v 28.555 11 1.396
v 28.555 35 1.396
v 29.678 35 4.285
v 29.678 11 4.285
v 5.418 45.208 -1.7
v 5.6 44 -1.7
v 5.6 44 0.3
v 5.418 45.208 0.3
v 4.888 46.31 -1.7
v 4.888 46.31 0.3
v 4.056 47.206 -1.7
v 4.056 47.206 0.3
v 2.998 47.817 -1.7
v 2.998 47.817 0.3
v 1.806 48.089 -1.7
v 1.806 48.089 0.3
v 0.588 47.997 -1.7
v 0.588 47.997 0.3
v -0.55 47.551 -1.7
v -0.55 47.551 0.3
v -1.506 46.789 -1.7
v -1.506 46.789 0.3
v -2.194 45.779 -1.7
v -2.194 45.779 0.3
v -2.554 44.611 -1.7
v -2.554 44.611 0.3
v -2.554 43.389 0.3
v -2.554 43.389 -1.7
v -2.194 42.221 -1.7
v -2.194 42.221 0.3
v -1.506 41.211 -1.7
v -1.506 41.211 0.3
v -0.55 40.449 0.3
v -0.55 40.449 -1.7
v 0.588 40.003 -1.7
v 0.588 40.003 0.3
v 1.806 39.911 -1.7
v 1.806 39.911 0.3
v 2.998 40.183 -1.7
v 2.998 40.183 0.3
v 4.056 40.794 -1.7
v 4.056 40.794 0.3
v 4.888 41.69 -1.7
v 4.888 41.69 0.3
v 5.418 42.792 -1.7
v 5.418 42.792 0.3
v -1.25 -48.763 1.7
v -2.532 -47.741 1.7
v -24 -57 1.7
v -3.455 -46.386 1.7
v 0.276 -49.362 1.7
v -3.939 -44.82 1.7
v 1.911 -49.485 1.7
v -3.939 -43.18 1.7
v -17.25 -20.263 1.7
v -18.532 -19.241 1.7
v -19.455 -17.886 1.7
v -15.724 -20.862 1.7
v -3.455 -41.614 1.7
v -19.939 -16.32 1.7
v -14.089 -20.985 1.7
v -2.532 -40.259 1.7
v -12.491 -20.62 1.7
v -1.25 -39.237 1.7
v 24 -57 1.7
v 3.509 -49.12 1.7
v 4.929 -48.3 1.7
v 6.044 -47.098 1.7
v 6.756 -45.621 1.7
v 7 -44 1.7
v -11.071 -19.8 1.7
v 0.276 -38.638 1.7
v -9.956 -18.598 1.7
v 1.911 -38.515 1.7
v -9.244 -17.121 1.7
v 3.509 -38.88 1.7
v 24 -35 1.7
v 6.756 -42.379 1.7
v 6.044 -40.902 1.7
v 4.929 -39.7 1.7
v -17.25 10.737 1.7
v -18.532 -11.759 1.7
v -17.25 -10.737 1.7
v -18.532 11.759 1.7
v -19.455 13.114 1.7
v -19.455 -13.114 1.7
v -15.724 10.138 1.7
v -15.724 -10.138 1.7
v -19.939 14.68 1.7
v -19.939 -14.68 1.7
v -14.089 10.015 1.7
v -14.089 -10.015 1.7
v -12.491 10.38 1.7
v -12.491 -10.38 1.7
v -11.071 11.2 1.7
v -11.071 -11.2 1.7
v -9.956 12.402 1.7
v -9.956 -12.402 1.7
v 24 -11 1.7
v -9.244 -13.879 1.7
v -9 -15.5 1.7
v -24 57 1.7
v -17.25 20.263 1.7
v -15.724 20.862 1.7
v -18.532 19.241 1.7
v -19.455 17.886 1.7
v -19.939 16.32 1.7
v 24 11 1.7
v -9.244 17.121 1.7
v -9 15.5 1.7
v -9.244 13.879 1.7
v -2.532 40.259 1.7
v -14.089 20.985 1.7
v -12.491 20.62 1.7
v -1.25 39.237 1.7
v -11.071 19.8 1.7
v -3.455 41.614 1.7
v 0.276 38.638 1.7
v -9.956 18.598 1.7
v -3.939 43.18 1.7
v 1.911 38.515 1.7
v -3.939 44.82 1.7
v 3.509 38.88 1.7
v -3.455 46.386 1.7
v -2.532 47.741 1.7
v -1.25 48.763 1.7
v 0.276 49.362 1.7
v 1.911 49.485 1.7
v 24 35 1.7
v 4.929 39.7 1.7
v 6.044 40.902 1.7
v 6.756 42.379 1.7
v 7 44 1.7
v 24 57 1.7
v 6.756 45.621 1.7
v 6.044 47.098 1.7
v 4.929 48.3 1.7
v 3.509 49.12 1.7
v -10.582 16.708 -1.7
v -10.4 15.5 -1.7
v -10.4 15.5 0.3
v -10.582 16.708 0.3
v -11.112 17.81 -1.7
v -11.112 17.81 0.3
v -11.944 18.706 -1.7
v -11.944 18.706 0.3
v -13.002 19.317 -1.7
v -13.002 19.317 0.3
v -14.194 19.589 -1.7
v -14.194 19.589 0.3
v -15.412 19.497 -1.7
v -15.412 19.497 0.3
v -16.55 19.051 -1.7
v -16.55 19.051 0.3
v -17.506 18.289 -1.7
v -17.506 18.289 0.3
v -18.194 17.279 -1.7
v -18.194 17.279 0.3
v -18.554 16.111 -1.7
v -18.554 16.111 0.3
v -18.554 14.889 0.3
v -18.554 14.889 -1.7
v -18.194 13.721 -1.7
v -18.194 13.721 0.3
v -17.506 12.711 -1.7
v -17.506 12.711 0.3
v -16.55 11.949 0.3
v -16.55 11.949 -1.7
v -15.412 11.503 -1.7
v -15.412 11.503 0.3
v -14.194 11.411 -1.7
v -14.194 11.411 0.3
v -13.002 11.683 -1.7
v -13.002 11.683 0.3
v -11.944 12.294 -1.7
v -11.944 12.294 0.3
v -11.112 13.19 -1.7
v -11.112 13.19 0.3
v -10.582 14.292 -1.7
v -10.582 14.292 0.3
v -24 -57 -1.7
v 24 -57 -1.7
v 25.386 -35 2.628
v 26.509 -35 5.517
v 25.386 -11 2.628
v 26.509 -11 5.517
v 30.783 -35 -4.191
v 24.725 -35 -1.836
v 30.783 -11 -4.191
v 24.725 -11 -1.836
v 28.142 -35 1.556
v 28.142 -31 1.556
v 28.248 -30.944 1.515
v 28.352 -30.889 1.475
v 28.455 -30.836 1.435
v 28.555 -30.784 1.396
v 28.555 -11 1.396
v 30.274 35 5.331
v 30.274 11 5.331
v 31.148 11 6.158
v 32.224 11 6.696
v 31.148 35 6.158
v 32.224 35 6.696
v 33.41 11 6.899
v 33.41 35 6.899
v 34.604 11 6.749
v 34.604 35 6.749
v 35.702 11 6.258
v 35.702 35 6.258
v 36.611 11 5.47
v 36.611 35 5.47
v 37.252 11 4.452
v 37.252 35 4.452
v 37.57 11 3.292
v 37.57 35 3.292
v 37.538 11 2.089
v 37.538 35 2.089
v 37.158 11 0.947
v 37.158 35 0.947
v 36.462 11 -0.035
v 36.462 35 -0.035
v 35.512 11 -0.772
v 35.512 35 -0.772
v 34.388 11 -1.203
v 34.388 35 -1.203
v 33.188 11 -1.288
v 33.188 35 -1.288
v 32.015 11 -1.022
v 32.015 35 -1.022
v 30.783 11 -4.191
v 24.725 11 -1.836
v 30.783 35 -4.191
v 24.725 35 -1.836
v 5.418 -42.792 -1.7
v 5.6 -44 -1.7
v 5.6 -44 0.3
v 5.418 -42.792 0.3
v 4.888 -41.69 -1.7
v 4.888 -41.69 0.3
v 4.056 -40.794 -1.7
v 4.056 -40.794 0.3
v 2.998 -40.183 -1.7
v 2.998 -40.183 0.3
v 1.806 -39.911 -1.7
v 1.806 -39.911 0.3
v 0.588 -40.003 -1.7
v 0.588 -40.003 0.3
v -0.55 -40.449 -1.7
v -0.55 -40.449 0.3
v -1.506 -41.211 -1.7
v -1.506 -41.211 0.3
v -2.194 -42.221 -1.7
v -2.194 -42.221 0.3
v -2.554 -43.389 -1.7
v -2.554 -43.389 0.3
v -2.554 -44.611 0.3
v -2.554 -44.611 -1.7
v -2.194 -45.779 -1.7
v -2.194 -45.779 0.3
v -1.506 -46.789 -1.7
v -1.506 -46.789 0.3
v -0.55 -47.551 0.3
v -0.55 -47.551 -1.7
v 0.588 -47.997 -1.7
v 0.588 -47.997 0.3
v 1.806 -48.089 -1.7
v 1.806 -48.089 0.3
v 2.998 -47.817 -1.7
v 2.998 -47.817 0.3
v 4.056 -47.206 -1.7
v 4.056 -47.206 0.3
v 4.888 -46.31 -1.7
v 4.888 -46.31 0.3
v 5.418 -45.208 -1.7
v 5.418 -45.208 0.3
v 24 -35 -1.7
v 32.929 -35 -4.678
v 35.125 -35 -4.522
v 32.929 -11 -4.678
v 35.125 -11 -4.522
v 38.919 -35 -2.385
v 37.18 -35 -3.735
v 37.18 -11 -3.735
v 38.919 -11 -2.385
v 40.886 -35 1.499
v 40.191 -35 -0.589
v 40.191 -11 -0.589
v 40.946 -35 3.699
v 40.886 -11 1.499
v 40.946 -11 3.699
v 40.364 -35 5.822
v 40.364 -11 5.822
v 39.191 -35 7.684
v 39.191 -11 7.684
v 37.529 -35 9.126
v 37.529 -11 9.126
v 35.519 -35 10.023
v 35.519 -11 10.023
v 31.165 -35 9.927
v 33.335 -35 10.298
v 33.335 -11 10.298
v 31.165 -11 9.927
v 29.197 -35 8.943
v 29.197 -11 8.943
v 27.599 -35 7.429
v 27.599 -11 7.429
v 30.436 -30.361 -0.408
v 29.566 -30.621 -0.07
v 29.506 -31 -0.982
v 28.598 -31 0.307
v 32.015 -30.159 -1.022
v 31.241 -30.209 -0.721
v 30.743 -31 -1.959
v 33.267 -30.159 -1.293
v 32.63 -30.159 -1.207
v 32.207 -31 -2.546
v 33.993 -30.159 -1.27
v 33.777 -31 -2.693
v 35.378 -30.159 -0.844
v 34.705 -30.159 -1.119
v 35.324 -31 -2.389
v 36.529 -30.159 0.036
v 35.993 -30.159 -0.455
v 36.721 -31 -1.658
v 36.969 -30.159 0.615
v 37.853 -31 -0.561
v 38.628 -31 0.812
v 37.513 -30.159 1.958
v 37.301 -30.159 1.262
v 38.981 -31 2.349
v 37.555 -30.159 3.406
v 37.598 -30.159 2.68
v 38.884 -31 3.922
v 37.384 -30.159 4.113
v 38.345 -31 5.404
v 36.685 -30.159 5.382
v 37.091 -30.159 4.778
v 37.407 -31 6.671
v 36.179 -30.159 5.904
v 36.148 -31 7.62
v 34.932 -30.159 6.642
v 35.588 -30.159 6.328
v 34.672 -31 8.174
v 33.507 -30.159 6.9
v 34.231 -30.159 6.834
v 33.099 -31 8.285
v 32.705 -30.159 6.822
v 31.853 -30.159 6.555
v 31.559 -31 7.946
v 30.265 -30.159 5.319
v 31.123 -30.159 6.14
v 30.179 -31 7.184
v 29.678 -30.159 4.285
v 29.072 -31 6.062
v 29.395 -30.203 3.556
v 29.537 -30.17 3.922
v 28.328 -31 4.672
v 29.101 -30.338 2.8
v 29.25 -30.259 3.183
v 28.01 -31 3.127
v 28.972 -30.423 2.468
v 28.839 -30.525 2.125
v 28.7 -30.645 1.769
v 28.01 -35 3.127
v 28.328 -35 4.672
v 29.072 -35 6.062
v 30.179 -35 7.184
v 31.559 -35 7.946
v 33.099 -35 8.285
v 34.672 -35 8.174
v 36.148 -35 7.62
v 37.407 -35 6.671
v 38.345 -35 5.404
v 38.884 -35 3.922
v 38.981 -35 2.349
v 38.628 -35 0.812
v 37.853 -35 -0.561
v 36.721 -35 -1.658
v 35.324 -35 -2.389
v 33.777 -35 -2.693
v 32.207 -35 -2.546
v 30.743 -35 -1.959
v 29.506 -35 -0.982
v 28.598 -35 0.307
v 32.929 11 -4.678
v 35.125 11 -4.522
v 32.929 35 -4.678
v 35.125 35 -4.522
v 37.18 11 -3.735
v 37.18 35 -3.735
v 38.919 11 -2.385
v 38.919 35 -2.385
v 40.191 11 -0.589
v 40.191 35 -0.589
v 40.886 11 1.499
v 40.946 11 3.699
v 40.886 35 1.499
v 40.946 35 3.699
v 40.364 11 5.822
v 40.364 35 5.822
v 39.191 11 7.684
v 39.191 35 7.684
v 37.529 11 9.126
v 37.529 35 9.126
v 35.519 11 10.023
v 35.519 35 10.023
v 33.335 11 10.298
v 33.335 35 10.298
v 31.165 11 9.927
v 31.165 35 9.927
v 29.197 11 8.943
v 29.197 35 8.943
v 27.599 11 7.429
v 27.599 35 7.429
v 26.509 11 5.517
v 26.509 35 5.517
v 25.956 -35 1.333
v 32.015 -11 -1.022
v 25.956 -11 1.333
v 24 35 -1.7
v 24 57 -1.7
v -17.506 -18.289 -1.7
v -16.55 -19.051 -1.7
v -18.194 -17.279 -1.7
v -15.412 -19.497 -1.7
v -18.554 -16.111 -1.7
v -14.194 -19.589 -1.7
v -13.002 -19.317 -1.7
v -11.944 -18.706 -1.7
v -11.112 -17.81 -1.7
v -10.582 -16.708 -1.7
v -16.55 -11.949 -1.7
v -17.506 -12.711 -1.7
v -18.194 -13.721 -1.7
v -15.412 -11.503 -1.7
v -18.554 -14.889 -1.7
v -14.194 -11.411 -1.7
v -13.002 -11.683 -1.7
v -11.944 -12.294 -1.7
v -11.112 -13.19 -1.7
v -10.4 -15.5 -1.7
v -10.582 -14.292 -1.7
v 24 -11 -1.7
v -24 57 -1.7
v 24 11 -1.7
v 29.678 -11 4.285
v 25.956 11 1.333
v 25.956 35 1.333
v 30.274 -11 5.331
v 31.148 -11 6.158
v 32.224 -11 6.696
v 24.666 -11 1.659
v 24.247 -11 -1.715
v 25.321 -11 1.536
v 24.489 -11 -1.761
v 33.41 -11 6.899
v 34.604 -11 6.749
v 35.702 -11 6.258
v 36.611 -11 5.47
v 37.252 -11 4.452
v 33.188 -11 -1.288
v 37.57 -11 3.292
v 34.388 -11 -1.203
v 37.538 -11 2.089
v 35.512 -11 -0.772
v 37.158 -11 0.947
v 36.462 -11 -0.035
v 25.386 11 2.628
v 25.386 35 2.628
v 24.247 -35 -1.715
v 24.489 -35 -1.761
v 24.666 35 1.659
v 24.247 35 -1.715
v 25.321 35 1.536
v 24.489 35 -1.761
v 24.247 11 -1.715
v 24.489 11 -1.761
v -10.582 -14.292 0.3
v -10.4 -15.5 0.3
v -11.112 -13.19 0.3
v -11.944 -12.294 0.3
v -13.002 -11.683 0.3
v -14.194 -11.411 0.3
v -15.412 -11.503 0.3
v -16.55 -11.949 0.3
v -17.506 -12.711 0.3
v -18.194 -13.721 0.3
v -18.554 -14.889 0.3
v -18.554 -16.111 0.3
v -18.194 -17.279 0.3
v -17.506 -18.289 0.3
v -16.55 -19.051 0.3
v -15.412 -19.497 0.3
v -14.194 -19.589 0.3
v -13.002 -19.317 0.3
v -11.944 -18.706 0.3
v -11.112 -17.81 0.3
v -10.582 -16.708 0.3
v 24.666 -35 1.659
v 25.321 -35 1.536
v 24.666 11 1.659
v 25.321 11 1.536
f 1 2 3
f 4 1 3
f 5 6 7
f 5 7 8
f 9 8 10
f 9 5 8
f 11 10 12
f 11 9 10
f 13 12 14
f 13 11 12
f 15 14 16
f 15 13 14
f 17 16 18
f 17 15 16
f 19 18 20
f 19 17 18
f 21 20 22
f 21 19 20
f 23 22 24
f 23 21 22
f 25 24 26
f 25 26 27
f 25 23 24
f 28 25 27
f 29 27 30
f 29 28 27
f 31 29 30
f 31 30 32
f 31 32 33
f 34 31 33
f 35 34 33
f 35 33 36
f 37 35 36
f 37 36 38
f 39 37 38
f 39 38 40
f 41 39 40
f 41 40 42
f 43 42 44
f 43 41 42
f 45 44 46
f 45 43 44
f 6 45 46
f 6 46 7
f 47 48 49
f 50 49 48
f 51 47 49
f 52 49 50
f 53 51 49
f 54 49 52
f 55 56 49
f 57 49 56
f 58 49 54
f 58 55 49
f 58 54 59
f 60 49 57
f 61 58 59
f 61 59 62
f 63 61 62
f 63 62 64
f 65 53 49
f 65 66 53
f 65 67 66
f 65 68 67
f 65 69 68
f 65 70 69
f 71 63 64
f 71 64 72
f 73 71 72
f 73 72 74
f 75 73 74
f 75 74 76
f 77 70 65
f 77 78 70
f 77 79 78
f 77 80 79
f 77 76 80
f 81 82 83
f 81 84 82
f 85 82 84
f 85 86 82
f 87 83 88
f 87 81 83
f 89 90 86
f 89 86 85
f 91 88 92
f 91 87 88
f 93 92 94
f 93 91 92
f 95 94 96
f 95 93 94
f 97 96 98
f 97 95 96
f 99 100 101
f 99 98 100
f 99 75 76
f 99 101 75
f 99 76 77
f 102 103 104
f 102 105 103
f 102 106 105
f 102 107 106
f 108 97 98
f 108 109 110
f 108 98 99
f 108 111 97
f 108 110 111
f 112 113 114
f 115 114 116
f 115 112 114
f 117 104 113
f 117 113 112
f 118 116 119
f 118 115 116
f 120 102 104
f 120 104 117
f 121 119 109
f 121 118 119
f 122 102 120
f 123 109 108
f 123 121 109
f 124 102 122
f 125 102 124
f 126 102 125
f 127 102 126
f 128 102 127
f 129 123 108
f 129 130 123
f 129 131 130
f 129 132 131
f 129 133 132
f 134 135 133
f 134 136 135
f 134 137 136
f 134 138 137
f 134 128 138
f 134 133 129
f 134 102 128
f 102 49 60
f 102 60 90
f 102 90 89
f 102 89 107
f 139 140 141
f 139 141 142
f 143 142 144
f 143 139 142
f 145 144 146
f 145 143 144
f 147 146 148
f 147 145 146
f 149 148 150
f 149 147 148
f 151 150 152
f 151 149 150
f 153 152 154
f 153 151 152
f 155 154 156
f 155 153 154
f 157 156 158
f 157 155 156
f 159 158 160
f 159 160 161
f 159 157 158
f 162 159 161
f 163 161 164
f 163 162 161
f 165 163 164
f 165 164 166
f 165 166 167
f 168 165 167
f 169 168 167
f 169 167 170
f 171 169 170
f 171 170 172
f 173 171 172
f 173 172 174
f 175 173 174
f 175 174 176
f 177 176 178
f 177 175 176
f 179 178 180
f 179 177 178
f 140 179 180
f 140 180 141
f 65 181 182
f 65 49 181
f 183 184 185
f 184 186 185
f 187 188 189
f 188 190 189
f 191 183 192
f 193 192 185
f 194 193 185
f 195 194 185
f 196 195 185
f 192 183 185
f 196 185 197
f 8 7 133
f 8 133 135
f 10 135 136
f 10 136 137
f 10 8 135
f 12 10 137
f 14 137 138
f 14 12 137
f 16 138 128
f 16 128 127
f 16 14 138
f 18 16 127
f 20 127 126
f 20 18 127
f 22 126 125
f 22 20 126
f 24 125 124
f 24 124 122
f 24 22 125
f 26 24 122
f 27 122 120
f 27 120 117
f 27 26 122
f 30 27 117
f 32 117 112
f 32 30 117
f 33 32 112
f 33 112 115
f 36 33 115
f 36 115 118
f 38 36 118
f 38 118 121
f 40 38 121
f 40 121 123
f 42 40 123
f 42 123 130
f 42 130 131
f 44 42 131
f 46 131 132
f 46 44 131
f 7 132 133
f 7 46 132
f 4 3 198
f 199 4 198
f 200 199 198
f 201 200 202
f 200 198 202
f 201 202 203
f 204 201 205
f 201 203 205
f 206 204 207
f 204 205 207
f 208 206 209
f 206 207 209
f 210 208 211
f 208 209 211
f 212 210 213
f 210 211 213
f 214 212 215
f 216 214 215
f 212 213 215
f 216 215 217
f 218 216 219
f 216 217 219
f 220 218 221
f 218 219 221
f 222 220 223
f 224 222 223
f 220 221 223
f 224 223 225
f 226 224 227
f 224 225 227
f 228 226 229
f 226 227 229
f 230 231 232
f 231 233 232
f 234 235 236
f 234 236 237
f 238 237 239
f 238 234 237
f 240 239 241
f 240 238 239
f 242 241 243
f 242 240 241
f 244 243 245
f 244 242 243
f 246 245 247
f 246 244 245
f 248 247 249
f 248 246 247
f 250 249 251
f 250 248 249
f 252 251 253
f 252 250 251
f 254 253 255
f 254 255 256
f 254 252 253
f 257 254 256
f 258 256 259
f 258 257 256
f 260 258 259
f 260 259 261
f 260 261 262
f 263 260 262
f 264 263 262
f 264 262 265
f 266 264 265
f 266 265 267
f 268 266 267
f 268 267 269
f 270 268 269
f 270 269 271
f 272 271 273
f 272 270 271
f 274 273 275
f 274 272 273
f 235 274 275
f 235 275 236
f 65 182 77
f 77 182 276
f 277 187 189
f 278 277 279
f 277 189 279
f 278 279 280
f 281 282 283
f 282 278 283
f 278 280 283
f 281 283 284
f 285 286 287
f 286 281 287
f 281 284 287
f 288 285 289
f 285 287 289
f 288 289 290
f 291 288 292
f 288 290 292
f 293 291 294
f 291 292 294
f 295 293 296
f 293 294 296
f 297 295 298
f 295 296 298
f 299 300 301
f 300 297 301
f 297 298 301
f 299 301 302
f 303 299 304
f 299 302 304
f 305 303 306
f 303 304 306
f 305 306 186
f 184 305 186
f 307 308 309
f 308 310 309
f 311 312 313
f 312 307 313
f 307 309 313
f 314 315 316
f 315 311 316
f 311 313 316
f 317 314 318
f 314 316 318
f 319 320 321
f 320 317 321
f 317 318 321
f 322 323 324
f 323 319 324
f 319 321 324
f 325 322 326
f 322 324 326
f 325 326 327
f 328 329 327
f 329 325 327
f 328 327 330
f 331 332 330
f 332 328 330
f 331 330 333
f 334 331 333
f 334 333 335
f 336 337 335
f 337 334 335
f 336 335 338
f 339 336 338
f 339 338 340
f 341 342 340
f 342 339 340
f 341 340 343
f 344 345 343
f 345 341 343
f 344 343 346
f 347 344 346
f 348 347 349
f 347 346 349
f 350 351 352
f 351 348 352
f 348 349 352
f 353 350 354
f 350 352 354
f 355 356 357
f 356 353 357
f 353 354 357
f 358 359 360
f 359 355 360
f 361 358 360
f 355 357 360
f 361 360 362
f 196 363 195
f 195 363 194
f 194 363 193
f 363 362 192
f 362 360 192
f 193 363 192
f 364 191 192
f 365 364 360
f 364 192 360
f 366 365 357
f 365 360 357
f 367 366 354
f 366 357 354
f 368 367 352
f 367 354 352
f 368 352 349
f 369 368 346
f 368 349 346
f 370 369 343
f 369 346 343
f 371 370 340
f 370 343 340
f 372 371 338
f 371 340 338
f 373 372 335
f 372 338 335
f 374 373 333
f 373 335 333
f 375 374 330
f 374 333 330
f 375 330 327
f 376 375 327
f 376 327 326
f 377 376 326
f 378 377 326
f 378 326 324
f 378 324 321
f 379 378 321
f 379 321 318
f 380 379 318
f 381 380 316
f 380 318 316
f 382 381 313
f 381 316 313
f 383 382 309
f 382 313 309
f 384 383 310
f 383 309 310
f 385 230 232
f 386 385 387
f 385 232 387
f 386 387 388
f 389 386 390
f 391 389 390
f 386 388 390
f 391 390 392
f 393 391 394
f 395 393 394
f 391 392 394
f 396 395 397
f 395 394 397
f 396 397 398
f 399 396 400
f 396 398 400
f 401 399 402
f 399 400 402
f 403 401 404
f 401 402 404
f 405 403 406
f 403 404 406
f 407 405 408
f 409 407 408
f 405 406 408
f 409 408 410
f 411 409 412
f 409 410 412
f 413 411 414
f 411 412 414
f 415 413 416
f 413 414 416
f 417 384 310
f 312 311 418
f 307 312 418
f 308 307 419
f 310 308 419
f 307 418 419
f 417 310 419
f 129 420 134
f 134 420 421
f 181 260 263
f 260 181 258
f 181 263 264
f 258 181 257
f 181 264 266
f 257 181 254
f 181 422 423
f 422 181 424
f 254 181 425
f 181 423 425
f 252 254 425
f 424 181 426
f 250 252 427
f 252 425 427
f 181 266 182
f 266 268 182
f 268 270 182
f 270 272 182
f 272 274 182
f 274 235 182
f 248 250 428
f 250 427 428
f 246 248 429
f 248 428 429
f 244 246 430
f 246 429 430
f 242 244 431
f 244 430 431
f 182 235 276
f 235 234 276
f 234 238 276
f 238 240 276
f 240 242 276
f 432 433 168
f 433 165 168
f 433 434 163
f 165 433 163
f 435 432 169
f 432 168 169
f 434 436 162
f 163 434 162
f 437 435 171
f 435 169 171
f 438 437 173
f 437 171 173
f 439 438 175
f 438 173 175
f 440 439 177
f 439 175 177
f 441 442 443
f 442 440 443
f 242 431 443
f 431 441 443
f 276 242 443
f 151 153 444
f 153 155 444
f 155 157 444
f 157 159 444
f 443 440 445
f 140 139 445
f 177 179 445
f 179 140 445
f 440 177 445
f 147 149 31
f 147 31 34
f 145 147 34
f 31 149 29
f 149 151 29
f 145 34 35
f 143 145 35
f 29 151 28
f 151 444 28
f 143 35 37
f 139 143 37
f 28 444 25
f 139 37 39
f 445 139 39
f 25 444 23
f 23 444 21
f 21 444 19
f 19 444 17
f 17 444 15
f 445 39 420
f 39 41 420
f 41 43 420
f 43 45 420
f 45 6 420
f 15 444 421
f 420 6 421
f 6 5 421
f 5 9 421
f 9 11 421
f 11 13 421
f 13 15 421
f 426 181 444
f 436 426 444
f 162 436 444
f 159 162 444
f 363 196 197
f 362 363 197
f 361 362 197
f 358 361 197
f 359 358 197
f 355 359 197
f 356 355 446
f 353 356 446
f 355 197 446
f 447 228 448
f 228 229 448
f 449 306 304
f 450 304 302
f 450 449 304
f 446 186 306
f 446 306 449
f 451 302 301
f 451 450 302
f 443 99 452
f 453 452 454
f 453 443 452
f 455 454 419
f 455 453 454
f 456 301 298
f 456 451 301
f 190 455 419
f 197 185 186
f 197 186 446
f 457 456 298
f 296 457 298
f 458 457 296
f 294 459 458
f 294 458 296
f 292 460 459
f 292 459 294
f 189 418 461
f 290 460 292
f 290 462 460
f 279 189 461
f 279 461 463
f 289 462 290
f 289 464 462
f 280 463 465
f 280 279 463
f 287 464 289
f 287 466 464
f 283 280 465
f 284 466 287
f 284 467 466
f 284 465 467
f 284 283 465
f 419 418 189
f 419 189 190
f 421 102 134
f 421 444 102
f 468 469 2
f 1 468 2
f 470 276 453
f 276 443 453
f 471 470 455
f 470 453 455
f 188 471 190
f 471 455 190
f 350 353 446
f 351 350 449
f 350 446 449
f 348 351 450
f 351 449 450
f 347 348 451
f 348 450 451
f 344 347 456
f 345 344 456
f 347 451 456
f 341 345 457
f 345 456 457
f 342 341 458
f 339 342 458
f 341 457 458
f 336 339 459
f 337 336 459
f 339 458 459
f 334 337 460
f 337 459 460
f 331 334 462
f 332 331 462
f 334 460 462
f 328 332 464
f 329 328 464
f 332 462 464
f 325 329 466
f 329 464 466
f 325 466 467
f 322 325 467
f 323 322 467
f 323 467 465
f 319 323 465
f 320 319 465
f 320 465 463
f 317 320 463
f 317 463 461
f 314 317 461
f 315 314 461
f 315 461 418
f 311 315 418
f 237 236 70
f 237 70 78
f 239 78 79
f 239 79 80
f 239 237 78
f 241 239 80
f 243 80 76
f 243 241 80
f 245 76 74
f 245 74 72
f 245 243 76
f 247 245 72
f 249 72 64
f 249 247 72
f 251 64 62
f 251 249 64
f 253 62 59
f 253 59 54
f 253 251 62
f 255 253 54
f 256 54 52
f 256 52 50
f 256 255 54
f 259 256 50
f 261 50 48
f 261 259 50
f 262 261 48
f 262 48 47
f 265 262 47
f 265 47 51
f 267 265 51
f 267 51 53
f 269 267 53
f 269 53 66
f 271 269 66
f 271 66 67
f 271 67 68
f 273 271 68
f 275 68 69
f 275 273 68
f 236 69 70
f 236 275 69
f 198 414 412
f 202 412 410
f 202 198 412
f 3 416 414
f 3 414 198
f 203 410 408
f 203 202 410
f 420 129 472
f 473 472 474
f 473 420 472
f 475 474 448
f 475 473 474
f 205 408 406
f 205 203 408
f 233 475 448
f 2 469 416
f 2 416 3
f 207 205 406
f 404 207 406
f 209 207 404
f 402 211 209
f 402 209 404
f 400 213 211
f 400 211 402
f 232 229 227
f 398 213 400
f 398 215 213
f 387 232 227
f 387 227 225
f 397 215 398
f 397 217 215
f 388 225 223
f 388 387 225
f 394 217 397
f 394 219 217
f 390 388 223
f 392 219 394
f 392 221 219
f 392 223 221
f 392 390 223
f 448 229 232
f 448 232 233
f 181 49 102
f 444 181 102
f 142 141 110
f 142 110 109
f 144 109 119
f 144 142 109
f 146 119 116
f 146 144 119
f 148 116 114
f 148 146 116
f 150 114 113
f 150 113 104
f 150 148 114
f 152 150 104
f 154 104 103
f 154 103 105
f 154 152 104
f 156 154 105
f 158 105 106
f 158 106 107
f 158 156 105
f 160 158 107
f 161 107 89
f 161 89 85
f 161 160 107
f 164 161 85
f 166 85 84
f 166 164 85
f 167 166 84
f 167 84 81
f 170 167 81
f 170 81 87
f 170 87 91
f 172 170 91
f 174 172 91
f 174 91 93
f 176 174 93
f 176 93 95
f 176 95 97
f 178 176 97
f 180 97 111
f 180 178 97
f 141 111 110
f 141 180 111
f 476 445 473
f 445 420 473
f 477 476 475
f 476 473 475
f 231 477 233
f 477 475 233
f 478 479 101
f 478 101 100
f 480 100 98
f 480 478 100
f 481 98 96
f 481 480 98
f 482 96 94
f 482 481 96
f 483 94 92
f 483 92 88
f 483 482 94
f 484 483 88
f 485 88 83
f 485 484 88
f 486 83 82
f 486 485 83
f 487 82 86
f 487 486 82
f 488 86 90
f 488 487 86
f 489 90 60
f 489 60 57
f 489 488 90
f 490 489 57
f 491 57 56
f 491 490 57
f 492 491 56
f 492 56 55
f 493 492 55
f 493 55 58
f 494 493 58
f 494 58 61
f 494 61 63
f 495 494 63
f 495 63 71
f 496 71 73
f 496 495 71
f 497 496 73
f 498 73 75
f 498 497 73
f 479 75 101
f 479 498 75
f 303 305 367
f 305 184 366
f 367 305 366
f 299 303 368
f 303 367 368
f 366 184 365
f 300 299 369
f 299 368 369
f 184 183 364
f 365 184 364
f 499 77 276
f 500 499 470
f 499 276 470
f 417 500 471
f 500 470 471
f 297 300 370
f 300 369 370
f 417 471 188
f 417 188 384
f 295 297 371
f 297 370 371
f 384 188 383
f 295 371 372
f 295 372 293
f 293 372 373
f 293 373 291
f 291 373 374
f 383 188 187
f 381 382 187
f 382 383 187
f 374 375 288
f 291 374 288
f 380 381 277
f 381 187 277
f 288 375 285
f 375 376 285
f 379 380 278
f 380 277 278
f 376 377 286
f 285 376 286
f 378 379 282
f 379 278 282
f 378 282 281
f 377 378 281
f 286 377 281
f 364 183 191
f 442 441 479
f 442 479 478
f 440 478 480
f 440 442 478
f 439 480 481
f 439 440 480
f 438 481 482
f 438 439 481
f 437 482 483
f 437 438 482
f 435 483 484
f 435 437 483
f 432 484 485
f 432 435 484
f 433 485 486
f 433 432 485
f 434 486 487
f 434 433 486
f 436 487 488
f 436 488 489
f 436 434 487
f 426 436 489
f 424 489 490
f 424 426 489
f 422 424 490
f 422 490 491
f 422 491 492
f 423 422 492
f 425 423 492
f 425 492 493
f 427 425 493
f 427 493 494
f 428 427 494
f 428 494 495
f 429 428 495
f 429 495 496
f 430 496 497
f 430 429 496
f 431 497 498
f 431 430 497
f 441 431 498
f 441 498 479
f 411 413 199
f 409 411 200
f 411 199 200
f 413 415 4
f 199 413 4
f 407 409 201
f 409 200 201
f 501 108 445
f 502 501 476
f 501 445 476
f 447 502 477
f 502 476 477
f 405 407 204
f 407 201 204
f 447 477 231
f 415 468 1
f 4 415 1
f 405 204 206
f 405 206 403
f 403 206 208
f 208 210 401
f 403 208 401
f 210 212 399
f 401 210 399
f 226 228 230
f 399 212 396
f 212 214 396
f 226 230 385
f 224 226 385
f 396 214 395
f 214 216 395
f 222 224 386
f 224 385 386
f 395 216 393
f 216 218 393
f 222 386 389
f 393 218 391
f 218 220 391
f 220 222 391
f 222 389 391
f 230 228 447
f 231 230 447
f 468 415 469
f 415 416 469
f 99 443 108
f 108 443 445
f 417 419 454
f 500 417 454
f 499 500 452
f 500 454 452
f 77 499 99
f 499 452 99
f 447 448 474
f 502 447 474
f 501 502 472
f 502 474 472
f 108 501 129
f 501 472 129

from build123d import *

# Parameters (mm, degrees)
BODYS_W                        = 48
BODYS_H                        = 114
BODY_DEPTH                     = 1.7
MIRROR1_START                  = -1.7
MIRROR1_OUTLINE_R              = 4.1
MIRROR1_DEPTH                  = 3.4
KNUCKLEBODY_REACH              = 63.87
KNUCKLEBODY_DIRECTION_2_REACH  = 63.87
KNUCKLECUT_DEPTH               = 71.965414111
KNUCKLECUT_DEPTH_BACK          = 71.965414111
KNUCKLECUTS_W                  = 17
KNUCKLECUTS_H                  = 22
HOLECHAMFER_SIZE               = 1.4
F_11_0_11_DIAMETER_HOLE2_D     = 11
F_11_0_11_DIAMETER_HOLE2_DEPTH = 4
F_11_0_11_DIAMETER_HOLE2_TIP   = 3.304733405


# Read off the part's stored shape, not the designer's step: Mirror1
with BuildPart() as part:
    # BodyS → Body (new, symmetric)
    with BuildSketch(Plane.XY):
        Rectangle(BODYS_W, BODYS_H)
    extrude(amount=BODY_DEPTH, both=True)

    # Mirror1 outline → Mirror1 (cut)
    with BuildSketch(Plane.XY.offset(MIRROR1_START)):
        with Locations((-14.5, 15.5)):
            Circle(MIRROR1_OUTLINE_R)
        with Locations((1.5, 44)):
            Circle(MIRROR1_OUTLINE_R)
        with Locations((-14.5, -15.5)):
            Circle(MIRROR1_OUTLINE_R)
        with Locations((1.5, -44)):
            Circle(MIRROR1_OUTLINE_R)
    extrude(amount=MIRROR1_DEPTH, mode=Mode.SUBTRACT)

    # KnuckleBody: up to this face of the body (flat: up to its plane)
    knucklebody_end = Plane(part.part.faces().sort_by_distance((0, 57, 0))[0])
    # KnuckleBodyS → KnuckleBody (add, up to the picked face)
    with BuildSketch(Plane(origin=(0, 0, 0), x_dir=(1, 0, 0), z_dir=(0, 1, 0)), mode=Mode.PRIVATE) as knucklebody_sk1:
        with BuildLine():
            Line((25.386415094, -2.62754717), (28.555471698, -1.395849057))
            Line((28.555471698, -1.395849057), (29.678490566, -4.285283019))
            ThreePointArc((29.678490566, -4.285283019), (37.25246893, -4.451961541), (32.014716981, 1.021509434))
            Line((32.014716981, 1.021509434), (25.956226415, -1.333207547))
            ThreePointArc((25.956226415, -1.333207547), (24.995158089, -1.607509809), (24, -1.7))
            Line((24, -1.7), (24, 1.7))
            ThreePointArc((24, 1.7), (24.36857707, 1.734255626), (24.724528302, 1.835849057))
            Line((24.724528302, 1.835849057), (30.783018868, 4.190566038))
            ThreePointArc((30.783018868, 4.190566038), (40.364272432, -5.821880867), (26.509433962, -5.516981132))
            Line((26.509433962, -5.516981132), (25.386415094, -2.62754717))
        make_face()
    knucklebody_tool1 = split(extrude(knucklebody_sk1.sketch, amount=KNUCKLEBODY_REACH, mode=Mode.PRIVATE), bisect_by=knucklebody_end, keep=Keep.BOTH, mode=Mode.PRIVATE)
    add(knucklebody_tool1.solids().sort_by(Axis((26.159241, 0, 3.990133), (0, 1, 0)))[0])

    # KnuckleBody direction 2: up to this face of the body (flat: up to its plane)
    knucklebody_direction_2_end = Plane(part.part.faces().sort_by_distance((0, -57, 0))[0])
    # KnuckleBodyS → KnuckleBody direction 2 (add, up to the picked face)
    with BuildSketch(Plane(origin=(0, 0, 0), x_dir=(1, 0, 0), z_dir=(0, 1, 0)), mode=Mode.PRIVATE) as knucklebody_direction_2_sk1:
        with BuildLine():
            Line((25.386415094, -2.62754717), (28.555471698, -1.395849057))
            Line((28.555471698, -1.395849057), (29.678490566, -4.285283019))
            ThreePointArc((29.678490566, -4.285283019), (37.25246893, -4.451961541), (32.014716981, 1.021509434))
            Line((32.014716981, 1.021509434), (25.956226415, -1.333207547))
            ThreePointArc((25.956226415, -1.333207547), (24.995158089, -1.607509809), (24, -1.7))
            Line((24, -1.7), (24, 1.7))
            ThreePointArc((24, 1.7), (24.36857707, 1.734255626), (24.724528302, 1.835849057))
            Line((24.724528302, 1.835849057), (30.783018868, 4.190566038))
            ThreePointArc((30.783018868, 4.190566038), (40.364272432, -5.821880867), (26.509433962, -5.516981132))
            Line((26.509433962, -5.516981132), (25.386415094, -2.62754717))
        make_face()
    knucklebody_direction_2_tool1 = split(extrude(knucklebody_direction_2_sk1.sketch, amount=-KNUCKLEBODY_DIRECTION_2_REACH, mode=Mode.PRIVATE), bisect_by=knucklebody_direction_2_end, keep=Keep.BOTH, mode=Mode.PRIVATE)
    add(knucklebody_direction_2_tool1.solids().sort_by(Axis((26.159241, 0, 3.990133), (0, -1, 0)))[0])

    # KnuckleCutS → KnuckleCut (cut, two sides: drawn at the far end of the back side and taken through both)
    with BuildSketch(Plane.XY.offset(-KNUCKLECUT_DEPTH_BACK)):
        with Locations((32.5, 46)):
            Rectangle(KNUCKLECUTS_W, KNUCKLECUTS_H)
        with Locations((32.5, -46)):
            Rectangle(KNUCKLECUTS_W, KNUCKLECUTS_H)
        with Locations((32.5, 0)):
            Rectangle(KNUCKLECUTS_W, KNUCKLECUTS_H)
    extrude(amount=KNUCKLECUT_DEPTH + KNUCKLECUT_DEPTH_BACK, mode=Mode.SUBTRACT)

    # HoleChamfer
    holechamfer_edges = [part.edges().sort_by_distance(p)[0] for p in [
        (-18.6, 15.5, 1.7),
        (-2.6, 44, 1.7),
        (-18.6, -15.5, 1.7),
        (-2.6, -44, 1.7),
    ]]
    chamfer(holechamfer_edges, length=HOLECHAMFER_SIZE)

    # Ø11.0 (11) Diameter Hole2
    with Locations(Plane(origin=(0, -35, 0), x_dir=(-1, 0, 0), z_dir=(0, -1, 0))):
        with Locations((-33.5, -2.8)):
            Hole(F_11_0_11_DIAMETER_HOLE2_D / 2, depth=F_11_0_11_DIAMETER_HOLE2_DEPTH)
            with Locations((0, 0, -(F_11_0_11_DIAMETER_HOLE2_DEPTH + F_11_0_11_DIAMETER_HOLE2_TIP / 2))):  # 118° drill point
                Cone(0, F_11_0_11_DIAMETER_HOLE2_D / 2, F_11_0_11_DIAMETER_HOLE2_TIP, mode=Mode.SUBTRACT)


solid = part.part
